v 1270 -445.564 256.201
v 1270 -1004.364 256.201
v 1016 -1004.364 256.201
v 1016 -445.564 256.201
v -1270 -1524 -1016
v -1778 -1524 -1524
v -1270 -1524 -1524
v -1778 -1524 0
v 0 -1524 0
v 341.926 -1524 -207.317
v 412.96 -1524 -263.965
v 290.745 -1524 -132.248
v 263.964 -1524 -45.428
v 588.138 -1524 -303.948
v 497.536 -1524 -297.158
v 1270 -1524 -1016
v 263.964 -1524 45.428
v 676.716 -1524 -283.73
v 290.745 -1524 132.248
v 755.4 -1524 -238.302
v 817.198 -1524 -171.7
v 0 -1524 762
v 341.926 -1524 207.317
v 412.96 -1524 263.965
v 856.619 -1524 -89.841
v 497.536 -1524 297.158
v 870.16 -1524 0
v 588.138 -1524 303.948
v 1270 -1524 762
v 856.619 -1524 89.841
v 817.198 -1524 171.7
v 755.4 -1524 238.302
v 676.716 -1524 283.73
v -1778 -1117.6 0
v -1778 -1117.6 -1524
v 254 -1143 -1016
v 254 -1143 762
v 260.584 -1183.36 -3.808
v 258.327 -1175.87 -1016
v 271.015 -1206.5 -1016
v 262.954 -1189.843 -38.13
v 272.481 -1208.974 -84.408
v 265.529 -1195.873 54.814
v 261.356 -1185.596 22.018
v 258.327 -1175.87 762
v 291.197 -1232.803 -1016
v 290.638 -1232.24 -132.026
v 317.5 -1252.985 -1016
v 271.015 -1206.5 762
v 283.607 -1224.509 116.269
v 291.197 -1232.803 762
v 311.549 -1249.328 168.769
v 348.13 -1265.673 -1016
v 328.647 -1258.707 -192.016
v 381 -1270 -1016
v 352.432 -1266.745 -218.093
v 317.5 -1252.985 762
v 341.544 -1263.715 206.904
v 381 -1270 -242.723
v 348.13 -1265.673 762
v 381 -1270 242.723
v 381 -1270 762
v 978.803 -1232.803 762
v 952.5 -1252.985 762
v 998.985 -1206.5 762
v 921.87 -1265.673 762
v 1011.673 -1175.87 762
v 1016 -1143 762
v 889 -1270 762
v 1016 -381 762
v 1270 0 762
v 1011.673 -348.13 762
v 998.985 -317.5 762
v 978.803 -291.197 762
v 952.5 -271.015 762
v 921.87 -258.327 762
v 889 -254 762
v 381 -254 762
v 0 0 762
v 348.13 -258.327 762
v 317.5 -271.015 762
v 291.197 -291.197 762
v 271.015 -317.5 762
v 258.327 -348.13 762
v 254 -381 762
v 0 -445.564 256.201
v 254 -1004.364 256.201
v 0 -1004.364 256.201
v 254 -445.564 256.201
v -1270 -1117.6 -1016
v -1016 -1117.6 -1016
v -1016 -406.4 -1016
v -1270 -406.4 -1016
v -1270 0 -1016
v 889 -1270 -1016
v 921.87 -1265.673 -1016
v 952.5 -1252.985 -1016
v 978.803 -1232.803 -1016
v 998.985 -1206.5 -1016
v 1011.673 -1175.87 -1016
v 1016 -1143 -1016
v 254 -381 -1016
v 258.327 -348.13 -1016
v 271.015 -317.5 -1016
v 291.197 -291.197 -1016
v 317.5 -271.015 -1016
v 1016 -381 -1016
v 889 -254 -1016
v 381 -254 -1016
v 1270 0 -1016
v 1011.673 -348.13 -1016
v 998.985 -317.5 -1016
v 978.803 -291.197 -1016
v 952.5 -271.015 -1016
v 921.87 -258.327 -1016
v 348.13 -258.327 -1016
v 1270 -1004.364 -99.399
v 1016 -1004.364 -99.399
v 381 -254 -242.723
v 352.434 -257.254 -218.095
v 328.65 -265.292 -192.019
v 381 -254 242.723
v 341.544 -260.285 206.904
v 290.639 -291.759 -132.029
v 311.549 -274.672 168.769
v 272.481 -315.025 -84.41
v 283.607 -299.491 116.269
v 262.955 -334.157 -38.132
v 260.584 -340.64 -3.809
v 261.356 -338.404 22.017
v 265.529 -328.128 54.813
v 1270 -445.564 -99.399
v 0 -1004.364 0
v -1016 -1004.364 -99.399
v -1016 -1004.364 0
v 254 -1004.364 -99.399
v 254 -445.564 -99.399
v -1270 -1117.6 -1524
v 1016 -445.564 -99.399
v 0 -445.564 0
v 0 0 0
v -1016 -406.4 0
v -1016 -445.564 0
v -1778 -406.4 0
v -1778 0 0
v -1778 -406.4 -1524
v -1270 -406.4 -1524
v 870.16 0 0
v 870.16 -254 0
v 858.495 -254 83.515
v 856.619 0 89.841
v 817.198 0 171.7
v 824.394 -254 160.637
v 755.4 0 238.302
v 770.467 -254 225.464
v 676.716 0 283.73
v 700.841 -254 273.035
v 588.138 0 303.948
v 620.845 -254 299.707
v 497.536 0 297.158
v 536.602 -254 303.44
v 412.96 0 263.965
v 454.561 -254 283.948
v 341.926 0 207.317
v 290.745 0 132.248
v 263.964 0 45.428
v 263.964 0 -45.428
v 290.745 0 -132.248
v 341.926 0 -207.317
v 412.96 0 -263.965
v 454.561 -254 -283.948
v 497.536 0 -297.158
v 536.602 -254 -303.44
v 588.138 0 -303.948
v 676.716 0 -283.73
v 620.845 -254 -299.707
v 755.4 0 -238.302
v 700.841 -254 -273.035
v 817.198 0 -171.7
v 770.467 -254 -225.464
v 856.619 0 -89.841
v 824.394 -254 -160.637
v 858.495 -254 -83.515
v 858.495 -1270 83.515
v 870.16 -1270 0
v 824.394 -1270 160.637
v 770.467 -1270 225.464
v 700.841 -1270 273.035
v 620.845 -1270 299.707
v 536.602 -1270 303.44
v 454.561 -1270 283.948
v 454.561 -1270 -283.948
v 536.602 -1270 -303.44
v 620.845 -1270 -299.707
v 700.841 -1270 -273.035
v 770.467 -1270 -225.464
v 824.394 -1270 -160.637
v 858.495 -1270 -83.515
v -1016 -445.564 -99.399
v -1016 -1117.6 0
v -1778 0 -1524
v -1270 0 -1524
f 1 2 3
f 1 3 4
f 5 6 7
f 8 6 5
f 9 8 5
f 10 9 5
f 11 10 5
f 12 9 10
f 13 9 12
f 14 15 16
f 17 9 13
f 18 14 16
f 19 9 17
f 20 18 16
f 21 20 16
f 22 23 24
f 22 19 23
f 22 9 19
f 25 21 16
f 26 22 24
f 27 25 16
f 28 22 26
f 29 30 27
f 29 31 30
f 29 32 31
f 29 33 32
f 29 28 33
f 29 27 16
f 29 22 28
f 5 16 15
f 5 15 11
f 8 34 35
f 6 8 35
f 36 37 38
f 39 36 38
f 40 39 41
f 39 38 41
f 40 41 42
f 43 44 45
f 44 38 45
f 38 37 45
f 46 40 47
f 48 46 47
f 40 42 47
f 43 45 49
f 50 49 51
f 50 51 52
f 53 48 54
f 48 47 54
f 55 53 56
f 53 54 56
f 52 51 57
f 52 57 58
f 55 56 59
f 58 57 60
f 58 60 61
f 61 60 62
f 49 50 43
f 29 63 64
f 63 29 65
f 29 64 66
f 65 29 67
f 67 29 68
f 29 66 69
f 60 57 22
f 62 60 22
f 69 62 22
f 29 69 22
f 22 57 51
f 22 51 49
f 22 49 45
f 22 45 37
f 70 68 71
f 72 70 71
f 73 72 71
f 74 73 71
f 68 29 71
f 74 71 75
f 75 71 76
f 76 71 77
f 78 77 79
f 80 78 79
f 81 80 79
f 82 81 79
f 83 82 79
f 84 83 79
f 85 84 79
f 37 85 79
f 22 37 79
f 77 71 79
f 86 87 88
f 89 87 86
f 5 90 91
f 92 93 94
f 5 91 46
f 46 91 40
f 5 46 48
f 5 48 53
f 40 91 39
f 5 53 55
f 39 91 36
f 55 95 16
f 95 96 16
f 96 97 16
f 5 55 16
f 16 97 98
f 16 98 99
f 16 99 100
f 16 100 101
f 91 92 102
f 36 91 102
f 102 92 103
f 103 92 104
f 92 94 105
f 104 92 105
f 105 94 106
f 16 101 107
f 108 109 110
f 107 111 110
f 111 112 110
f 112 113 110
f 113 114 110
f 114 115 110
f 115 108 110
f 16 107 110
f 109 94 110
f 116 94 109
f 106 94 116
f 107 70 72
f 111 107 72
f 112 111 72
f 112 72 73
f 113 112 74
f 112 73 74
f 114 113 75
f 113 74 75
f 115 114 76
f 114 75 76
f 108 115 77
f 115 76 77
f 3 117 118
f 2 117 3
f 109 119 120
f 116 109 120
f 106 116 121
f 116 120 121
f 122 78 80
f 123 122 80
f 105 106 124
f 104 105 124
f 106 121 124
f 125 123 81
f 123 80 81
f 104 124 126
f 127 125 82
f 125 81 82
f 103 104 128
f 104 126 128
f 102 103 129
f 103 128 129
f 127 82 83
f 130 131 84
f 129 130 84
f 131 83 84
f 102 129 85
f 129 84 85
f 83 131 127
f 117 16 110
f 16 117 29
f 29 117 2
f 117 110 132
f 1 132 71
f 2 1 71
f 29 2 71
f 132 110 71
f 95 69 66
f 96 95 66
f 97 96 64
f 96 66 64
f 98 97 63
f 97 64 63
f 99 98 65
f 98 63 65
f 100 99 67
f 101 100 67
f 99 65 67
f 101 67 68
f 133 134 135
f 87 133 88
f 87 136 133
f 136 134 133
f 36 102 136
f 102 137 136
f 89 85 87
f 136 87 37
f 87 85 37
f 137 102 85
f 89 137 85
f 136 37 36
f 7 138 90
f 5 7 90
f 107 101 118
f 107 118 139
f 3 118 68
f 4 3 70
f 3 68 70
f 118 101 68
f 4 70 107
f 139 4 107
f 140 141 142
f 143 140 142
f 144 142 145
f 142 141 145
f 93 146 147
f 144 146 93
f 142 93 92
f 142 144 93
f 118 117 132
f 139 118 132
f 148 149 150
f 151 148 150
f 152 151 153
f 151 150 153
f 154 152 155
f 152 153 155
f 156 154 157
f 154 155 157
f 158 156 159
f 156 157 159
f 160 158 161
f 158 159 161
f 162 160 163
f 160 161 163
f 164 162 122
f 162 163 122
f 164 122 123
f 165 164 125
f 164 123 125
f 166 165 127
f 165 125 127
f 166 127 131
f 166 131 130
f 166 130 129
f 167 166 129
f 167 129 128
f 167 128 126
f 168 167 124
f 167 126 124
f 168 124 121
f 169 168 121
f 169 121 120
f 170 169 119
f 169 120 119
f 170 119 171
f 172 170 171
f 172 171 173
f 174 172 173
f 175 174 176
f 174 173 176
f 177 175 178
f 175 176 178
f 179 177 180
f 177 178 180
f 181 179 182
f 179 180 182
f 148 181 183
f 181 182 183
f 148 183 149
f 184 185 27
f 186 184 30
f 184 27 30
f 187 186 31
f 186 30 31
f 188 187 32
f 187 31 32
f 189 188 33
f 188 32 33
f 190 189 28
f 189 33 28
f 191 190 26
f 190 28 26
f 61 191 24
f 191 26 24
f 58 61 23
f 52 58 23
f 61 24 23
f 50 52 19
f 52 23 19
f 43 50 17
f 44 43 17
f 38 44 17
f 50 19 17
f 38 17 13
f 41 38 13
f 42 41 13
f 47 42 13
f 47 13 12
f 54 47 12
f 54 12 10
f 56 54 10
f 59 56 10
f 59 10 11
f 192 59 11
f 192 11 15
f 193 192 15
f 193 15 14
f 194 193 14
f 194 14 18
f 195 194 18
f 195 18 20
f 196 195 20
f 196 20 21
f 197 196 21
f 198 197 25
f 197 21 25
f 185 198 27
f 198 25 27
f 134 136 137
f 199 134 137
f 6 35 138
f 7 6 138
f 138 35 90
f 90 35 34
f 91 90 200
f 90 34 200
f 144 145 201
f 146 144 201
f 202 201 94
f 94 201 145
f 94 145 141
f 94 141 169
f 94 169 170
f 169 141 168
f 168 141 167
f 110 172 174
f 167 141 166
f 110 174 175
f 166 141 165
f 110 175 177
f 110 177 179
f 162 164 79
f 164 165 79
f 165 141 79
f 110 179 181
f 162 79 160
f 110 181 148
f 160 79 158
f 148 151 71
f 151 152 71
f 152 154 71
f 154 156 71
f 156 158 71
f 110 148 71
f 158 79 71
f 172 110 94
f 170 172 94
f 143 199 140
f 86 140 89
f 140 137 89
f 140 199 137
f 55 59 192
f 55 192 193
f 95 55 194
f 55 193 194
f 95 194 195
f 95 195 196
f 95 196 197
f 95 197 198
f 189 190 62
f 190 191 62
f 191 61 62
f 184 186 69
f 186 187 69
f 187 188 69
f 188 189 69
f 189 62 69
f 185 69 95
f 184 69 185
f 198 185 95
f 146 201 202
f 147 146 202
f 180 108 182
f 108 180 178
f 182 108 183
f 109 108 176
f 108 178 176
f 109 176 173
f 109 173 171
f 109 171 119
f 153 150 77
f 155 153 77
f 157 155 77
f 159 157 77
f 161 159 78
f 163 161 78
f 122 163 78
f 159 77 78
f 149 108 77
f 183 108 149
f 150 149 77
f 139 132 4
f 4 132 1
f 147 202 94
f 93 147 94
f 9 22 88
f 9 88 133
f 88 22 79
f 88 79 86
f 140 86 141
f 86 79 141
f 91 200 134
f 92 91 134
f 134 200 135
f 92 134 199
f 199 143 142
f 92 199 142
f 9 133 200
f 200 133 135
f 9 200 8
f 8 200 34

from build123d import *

# Parameters (mm, degrees)
F1_DEPTH  = 1524
F2_W      = 762
F2_H      = 711.2
F3_DEPTH  = 1524
F4_R      = 304.8
F5_DEPTH  = 1524
F7_DEPTH  = 2286.001
F9_W      = 558.8
F9_H      = 355.6
F10_DEPTH = 3048.001


with BuildPart() as f1:
    # F0 (on Front) → F1 (new body)
    with BuildSketch(Plane.XZ):
        Polygon((0, 762), (0, 0), (-1778, 0), (-1778, -1016), (-1778, -1524), (-1270, -1524), (-1270, -1016), (1270, -1016), (1270, 762), align=None)
    extrude(amount=F1_DEPTH)

    # F2 (on face) → F3 (cut)
    with BuildSketch(Plane.XY):
        with Locations((-1397, -762)):
            Rectangle(F2_W, F2_H)
    extrude(amount=-F3_DEPTH, mode=Mode.SUBTRACT)

    # F4 (on face) → F5 (cut)
    with BuildSketch(Plane.XZ.offset(1524)):
        with Locations((565.36006, 0)):
            Circle(F4_R)
    extrude(amount=-F5_DEPTH, mode=Mode.SUBTRACT)

    # F6 (on face) → F7 (cut, through all)
    with BuildSketch(Plane.XY.offset(762)):
        with BuildLine():
            Line((381, -1270), (889, -1270))
            ThreePointArc((889, -1270), (978.802561, -1232.802561), (1016, -1143))
            Line((1016, -1143), (1016, -381))
            ThreePointArc((1016, -381), (978.802561, -291.197439), (889, -254))
            Line((889, -254), (381, -254))
            ThreePointArc((381, -254), (291.197439, -291.197439), (254, -381))
            Line((254, -381), (254, -1143))
            ThreePointArc((254, -1143), (291.197439, -1232.802561), (381, -1270))
        make_face()
    extrude(amount=-F7_DEPTH, mode=Mode.SUBTRACT)

    # F9 (on face) → F10 (cut, through all)
    with BuildSketch(Plane.YZ.offset(1270)):
        with Locations((-724.964005, 78.401349)):
            Rectangle(F9_W, F9_H)
    extrude(amount=-F10_DEPTH, mode=Mode.SUBTRACT)


solid = f1.part
